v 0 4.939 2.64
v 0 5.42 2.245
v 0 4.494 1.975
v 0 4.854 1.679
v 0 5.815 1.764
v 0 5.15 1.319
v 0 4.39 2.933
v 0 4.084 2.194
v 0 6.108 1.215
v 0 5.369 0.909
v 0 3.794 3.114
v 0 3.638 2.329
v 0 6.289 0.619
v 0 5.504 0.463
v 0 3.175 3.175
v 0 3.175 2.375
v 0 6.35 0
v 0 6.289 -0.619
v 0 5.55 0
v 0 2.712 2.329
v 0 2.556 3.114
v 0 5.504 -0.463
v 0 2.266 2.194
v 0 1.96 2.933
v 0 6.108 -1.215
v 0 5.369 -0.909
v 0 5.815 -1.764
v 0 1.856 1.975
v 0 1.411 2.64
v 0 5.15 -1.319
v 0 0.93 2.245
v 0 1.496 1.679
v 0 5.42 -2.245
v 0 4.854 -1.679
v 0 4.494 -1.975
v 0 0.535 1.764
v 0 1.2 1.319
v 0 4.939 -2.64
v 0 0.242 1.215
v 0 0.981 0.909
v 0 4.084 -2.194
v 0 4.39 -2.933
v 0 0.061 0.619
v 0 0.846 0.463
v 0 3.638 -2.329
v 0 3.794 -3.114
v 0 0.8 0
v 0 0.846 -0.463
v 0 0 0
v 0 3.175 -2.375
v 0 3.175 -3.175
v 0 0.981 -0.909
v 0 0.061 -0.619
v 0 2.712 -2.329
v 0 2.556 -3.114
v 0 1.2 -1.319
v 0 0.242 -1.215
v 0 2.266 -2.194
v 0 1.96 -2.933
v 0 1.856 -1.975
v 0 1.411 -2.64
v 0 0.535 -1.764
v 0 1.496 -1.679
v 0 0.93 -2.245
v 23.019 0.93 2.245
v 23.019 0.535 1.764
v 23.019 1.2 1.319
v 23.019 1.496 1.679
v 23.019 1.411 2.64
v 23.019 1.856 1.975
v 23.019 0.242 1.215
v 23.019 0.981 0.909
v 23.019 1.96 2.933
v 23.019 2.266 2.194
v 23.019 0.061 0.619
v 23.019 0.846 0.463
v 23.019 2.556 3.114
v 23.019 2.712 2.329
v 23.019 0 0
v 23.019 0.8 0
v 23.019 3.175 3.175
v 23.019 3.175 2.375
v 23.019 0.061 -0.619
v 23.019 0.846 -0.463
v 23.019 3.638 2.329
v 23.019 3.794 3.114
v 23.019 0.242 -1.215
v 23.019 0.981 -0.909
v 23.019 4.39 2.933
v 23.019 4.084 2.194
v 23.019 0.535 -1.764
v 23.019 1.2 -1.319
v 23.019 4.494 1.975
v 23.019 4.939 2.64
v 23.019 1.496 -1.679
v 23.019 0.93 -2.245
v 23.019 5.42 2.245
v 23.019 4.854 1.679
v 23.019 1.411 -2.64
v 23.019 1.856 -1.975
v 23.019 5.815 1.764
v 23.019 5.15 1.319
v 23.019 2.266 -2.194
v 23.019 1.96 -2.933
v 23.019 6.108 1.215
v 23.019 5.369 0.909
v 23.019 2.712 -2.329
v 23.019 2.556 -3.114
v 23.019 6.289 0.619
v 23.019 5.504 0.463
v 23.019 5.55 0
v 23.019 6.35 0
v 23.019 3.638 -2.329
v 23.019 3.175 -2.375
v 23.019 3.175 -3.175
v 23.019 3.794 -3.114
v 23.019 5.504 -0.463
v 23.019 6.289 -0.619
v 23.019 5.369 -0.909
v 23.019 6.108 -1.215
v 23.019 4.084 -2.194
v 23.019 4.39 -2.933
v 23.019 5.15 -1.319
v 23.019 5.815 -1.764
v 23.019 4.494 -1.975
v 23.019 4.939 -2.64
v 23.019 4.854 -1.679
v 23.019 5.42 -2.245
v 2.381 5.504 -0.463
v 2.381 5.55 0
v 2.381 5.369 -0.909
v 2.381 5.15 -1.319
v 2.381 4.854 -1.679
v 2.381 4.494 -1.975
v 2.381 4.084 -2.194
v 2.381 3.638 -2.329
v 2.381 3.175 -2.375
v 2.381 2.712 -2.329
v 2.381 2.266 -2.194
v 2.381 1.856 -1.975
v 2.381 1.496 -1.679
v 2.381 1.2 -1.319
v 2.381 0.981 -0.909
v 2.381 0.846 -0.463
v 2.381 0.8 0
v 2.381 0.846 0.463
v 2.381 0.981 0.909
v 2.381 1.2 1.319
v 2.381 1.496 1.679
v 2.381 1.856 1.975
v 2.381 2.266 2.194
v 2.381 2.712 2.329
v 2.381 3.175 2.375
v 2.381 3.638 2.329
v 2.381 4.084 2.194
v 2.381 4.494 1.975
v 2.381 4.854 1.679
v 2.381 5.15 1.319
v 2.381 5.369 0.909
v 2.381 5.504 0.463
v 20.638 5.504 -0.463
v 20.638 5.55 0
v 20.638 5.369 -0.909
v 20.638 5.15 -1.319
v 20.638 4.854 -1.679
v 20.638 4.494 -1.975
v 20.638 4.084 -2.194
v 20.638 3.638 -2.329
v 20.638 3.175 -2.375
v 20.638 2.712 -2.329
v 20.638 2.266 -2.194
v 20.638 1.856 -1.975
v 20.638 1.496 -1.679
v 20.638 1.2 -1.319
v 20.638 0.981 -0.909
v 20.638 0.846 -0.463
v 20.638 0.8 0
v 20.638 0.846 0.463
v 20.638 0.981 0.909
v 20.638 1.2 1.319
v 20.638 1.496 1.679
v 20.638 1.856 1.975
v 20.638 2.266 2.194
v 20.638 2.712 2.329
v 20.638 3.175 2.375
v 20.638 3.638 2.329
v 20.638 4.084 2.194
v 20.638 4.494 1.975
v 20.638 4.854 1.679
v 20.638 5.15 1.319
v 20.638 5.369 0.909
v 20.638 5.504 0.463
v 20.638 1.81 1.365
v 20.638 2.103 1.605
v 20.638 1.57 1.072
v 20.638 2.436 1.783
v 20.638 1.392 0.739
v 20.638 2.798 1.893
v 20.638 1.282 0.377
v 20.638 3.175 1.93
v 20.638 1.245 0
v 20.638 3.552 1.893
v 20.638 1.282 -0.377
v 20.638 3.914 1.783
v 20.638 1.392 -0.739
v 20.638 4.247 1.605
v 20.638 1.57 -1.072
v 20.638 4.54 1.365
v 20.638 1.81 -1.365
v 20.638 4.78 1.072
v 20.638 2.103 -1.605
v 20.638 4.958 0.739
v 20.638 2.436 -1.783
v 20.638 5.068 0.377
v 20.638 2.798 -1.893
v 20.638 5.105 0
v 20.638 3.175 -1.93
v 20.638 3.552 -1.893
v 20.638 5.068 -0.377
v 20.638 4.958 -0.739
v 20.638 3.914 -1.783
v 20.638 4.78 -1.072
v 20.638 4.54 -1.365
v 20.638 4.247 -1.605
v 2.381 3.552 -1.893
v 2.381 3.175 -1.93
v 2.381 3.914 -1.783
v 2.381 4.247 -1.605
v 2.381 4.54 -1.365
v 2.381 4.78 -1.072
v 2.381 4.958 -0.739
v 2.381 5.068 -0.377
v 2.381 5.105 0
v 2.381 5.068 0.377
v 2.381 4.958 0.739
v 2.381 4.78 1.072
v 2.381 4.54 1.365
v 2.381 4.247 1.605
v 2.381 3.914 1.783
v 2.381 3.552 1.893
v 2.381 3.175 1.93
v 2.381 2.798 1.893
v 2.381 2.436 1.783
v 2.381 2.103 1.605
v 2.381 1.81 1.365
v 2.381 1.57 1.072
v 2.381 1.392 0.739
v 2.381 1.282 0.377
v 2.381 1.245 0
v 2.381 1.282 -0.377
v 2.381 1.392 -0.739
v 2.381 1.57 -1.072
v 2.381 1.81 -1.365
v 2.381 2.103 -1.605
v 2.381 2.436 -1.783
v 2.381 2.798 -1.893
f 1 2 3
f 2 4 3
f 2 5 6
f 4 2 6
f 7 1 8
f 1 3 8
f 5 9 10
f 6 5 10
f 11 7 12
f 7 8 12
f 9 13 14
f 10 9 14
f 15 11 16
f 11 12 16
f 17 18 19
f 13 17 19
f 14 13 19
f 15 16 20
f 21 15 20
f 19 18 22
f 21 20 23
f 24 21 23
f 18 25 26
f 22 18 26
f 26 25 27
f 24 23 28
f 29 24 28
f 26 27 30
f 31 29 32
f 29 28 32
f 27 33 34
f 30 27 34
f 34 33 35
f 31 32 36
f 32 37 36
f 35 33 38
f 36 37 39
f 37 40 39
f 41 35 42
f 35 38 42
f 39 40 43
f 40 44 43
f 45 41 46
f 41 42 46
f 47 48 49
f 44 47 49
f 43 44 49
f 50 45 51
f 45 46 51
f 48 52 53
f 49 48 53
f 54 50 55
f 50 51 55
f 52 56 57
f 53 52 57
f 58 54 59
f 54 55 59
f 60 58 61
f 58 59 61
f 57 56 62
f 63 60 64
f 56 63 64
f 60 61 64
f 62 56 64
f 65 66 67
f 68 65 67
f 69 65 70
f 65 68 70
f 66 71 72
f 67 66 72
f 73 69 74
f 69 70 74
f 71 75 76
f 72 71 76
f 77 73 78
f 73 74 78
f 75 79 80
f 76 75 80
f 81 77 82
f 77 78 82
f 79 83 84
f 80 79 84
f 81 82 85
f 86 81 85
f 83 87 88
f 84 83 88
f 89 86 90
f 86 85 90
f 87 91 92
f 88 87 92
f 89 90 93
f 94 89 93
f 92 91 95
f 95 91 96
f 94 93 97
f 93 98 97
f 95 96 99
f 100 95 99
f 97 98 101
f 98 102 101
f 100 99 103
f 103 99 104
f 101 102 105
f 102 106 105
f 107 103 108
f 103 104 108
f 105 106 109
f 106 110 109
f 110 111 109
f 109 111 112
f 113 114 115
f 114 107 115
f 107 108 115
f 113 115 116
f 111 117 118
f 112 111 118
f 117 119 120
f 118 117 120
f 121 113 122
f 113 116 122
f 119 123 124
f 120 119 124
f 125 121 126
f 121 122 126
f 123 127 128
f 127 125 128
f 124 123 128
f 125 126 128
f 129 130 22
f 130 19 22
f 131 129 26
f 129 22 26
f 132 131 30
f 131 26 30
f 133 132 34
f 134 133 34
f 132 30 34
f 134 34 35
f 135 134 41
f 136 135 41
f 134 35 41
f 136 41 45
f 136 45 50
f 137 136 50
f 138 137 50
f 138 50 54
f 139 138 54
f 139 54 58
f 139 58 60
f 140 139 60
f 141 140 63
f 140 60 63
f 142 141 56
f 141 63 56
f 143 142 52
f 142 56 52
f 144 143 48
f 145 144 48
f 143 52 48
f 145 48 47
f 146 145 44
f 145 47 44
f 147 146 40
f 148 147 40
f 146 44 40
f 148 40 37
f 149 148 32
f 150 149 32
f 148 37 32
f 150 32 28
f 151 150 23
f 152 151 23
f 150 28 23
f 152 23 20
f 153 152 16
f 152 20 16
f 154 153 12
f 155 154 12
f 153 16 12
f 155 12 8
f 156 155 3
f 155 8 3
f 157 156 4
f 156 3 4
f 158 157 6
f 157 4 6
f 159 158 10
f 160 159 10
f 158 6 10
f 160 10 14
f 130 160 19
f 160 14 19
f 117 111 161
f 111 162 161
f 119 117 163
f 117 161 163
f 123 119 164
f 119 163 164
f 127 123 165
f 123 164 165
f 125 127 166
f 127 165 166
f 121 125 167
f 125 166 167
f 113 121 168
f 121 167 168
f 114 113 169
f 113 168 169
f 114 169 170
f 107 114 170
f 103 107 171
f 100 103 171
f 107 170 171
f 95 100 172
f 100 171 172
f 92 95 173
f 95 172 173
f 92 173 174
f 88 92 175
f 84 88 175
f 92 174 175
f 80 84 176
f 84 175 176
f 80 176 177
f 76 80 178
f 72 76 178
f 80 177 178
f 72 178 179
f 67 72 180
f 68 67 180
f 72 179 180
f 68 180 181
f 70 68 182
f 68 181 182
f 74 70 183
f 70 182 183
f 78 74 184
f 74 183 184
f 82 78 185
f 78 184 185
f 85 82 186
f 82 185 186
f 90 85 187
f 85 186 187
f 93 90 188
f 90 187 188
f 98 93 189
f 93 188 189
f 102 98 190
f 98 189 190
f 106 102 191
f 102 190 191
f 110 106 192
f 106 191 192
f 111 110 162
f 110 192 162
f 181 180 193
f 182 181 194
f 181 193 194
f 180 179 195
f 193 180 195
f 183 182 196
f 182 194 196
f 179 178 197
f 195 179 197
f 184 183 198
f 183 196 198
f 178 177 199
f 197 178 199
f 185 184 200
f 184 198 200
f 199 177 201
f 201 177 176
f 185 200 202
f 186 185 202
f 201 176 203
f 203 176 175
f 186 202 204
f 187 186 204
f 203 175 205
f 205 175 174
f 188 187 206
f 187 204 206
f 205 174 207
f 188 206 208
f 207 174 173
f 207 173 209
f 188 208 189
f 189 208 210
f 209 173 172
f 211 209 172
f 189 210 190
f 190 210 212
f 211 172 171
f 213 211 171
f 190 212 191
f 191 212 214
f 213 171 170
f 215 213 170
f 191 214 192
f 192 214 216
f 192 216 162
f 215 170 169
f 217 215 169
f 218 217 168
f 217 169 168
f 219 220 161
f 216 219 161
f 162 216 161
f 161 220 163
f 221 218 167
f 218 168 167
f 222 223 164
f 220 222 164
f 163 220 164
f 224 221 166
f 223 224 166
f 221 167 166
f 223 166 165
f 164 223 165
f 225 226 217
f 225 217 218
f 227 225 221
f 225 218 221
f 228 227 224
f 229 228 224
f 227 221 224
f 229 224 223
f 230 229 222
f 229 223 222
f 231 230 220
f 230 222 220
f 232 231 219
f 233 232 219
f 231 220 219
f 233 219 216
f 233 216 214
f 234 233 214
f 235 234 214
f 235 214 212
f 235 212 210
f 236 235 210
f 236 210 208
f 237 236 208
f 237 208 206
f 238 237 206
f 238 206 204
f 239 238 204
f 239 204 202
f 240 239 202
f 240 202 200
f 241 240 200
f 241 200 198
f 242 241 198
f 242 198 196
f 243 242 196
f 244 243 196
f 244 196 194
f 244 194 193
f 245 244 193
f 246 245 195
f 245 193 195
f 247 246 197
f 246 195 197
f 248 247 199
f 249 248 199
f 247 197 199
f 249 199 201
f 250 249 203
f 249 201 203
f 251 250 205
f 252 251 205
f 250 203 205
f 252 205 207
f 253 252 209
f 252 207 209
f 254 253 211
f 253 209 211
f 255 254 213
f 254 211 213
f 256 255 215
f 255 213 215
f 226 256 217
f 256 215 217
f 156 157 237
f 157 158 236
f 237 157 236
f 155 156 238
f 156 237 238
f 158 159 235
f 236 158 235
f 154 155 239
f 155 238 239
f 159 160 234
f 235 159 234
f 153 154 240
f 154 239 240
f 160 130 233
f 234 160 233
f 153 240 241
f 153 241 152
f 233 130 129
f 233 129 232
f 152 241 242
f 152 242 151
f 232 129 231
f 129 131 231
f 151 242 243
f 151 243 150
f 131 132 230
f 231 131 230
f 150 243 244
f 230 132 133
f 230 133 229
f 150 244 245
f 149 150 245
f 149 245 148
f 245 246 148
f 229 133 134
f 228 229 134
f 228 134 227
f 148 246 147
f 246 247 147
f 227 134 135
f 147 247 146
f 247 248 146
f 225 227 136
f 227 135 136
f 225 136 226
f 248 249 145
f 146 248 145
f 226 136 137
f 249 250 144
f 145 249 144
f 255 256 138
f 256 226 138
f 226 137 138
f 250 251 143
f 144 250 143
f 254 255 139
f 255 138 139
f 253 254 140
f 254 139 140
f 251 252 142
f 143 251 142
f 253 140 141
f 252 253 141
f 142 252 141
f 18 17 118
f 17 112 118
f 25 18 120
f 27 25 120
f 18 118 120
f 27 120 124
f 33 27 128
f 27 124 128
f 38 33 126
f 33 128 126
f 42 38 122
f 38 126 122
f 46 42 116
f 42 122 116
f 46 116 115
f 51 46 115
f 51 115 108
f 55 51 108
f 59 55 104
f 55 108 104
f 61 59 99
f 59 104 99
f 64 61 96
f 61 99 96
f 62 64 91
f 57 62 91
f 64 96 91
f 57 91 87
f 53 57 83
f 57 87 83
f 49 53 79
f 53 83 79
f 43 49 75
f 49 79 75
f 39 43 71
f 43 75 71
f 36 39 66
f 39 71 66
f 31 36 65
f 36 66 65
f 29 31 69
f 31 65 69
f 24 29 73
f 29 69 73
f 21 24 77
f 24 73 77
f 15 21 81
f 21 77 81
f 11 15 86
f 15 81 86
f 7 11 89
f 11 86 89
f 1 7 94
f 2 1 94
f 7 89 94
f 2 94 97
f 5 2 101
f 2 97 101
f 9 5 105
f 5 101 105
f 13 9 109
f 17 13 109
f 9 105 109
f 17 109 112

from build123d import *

# Parameters (mm, degrees)
F_24_0_152_DIAMETER_HOLE1_D = 3.8608


with BuildPart() as part:
    # Sketch1 → Revolve1 (revolve)
    with BuildSketch(Plane.XY, mode=Mode.PRIVATE) as revolve1_sk:
        Polygon((0, 0), (23.01875, 0), (23.01875, 0.8001), (20.6375, 0.8001), (20.6375, 3.175), (2.38125, 3.175), (2.38125, 0.8001), (0, 0.8001), align=None)
    revolve(revolve1_sk.sketch.rotate(Axis((1.613187702, 3.175, 0), (-1, 0, 0)), 180), axis=Axis((1.613187702, 3.175, 0), (-1, 0, 0)))

    # #24 (0.152) Diameter Hole1 (through all)
    with Locations(Plane.ZY.offset(-2.38125)):
        with Locations((0, 3.175)):
            Hole(F_24_0_152_DIAMETER_HOLE1_D / 2)


solid = part.part
